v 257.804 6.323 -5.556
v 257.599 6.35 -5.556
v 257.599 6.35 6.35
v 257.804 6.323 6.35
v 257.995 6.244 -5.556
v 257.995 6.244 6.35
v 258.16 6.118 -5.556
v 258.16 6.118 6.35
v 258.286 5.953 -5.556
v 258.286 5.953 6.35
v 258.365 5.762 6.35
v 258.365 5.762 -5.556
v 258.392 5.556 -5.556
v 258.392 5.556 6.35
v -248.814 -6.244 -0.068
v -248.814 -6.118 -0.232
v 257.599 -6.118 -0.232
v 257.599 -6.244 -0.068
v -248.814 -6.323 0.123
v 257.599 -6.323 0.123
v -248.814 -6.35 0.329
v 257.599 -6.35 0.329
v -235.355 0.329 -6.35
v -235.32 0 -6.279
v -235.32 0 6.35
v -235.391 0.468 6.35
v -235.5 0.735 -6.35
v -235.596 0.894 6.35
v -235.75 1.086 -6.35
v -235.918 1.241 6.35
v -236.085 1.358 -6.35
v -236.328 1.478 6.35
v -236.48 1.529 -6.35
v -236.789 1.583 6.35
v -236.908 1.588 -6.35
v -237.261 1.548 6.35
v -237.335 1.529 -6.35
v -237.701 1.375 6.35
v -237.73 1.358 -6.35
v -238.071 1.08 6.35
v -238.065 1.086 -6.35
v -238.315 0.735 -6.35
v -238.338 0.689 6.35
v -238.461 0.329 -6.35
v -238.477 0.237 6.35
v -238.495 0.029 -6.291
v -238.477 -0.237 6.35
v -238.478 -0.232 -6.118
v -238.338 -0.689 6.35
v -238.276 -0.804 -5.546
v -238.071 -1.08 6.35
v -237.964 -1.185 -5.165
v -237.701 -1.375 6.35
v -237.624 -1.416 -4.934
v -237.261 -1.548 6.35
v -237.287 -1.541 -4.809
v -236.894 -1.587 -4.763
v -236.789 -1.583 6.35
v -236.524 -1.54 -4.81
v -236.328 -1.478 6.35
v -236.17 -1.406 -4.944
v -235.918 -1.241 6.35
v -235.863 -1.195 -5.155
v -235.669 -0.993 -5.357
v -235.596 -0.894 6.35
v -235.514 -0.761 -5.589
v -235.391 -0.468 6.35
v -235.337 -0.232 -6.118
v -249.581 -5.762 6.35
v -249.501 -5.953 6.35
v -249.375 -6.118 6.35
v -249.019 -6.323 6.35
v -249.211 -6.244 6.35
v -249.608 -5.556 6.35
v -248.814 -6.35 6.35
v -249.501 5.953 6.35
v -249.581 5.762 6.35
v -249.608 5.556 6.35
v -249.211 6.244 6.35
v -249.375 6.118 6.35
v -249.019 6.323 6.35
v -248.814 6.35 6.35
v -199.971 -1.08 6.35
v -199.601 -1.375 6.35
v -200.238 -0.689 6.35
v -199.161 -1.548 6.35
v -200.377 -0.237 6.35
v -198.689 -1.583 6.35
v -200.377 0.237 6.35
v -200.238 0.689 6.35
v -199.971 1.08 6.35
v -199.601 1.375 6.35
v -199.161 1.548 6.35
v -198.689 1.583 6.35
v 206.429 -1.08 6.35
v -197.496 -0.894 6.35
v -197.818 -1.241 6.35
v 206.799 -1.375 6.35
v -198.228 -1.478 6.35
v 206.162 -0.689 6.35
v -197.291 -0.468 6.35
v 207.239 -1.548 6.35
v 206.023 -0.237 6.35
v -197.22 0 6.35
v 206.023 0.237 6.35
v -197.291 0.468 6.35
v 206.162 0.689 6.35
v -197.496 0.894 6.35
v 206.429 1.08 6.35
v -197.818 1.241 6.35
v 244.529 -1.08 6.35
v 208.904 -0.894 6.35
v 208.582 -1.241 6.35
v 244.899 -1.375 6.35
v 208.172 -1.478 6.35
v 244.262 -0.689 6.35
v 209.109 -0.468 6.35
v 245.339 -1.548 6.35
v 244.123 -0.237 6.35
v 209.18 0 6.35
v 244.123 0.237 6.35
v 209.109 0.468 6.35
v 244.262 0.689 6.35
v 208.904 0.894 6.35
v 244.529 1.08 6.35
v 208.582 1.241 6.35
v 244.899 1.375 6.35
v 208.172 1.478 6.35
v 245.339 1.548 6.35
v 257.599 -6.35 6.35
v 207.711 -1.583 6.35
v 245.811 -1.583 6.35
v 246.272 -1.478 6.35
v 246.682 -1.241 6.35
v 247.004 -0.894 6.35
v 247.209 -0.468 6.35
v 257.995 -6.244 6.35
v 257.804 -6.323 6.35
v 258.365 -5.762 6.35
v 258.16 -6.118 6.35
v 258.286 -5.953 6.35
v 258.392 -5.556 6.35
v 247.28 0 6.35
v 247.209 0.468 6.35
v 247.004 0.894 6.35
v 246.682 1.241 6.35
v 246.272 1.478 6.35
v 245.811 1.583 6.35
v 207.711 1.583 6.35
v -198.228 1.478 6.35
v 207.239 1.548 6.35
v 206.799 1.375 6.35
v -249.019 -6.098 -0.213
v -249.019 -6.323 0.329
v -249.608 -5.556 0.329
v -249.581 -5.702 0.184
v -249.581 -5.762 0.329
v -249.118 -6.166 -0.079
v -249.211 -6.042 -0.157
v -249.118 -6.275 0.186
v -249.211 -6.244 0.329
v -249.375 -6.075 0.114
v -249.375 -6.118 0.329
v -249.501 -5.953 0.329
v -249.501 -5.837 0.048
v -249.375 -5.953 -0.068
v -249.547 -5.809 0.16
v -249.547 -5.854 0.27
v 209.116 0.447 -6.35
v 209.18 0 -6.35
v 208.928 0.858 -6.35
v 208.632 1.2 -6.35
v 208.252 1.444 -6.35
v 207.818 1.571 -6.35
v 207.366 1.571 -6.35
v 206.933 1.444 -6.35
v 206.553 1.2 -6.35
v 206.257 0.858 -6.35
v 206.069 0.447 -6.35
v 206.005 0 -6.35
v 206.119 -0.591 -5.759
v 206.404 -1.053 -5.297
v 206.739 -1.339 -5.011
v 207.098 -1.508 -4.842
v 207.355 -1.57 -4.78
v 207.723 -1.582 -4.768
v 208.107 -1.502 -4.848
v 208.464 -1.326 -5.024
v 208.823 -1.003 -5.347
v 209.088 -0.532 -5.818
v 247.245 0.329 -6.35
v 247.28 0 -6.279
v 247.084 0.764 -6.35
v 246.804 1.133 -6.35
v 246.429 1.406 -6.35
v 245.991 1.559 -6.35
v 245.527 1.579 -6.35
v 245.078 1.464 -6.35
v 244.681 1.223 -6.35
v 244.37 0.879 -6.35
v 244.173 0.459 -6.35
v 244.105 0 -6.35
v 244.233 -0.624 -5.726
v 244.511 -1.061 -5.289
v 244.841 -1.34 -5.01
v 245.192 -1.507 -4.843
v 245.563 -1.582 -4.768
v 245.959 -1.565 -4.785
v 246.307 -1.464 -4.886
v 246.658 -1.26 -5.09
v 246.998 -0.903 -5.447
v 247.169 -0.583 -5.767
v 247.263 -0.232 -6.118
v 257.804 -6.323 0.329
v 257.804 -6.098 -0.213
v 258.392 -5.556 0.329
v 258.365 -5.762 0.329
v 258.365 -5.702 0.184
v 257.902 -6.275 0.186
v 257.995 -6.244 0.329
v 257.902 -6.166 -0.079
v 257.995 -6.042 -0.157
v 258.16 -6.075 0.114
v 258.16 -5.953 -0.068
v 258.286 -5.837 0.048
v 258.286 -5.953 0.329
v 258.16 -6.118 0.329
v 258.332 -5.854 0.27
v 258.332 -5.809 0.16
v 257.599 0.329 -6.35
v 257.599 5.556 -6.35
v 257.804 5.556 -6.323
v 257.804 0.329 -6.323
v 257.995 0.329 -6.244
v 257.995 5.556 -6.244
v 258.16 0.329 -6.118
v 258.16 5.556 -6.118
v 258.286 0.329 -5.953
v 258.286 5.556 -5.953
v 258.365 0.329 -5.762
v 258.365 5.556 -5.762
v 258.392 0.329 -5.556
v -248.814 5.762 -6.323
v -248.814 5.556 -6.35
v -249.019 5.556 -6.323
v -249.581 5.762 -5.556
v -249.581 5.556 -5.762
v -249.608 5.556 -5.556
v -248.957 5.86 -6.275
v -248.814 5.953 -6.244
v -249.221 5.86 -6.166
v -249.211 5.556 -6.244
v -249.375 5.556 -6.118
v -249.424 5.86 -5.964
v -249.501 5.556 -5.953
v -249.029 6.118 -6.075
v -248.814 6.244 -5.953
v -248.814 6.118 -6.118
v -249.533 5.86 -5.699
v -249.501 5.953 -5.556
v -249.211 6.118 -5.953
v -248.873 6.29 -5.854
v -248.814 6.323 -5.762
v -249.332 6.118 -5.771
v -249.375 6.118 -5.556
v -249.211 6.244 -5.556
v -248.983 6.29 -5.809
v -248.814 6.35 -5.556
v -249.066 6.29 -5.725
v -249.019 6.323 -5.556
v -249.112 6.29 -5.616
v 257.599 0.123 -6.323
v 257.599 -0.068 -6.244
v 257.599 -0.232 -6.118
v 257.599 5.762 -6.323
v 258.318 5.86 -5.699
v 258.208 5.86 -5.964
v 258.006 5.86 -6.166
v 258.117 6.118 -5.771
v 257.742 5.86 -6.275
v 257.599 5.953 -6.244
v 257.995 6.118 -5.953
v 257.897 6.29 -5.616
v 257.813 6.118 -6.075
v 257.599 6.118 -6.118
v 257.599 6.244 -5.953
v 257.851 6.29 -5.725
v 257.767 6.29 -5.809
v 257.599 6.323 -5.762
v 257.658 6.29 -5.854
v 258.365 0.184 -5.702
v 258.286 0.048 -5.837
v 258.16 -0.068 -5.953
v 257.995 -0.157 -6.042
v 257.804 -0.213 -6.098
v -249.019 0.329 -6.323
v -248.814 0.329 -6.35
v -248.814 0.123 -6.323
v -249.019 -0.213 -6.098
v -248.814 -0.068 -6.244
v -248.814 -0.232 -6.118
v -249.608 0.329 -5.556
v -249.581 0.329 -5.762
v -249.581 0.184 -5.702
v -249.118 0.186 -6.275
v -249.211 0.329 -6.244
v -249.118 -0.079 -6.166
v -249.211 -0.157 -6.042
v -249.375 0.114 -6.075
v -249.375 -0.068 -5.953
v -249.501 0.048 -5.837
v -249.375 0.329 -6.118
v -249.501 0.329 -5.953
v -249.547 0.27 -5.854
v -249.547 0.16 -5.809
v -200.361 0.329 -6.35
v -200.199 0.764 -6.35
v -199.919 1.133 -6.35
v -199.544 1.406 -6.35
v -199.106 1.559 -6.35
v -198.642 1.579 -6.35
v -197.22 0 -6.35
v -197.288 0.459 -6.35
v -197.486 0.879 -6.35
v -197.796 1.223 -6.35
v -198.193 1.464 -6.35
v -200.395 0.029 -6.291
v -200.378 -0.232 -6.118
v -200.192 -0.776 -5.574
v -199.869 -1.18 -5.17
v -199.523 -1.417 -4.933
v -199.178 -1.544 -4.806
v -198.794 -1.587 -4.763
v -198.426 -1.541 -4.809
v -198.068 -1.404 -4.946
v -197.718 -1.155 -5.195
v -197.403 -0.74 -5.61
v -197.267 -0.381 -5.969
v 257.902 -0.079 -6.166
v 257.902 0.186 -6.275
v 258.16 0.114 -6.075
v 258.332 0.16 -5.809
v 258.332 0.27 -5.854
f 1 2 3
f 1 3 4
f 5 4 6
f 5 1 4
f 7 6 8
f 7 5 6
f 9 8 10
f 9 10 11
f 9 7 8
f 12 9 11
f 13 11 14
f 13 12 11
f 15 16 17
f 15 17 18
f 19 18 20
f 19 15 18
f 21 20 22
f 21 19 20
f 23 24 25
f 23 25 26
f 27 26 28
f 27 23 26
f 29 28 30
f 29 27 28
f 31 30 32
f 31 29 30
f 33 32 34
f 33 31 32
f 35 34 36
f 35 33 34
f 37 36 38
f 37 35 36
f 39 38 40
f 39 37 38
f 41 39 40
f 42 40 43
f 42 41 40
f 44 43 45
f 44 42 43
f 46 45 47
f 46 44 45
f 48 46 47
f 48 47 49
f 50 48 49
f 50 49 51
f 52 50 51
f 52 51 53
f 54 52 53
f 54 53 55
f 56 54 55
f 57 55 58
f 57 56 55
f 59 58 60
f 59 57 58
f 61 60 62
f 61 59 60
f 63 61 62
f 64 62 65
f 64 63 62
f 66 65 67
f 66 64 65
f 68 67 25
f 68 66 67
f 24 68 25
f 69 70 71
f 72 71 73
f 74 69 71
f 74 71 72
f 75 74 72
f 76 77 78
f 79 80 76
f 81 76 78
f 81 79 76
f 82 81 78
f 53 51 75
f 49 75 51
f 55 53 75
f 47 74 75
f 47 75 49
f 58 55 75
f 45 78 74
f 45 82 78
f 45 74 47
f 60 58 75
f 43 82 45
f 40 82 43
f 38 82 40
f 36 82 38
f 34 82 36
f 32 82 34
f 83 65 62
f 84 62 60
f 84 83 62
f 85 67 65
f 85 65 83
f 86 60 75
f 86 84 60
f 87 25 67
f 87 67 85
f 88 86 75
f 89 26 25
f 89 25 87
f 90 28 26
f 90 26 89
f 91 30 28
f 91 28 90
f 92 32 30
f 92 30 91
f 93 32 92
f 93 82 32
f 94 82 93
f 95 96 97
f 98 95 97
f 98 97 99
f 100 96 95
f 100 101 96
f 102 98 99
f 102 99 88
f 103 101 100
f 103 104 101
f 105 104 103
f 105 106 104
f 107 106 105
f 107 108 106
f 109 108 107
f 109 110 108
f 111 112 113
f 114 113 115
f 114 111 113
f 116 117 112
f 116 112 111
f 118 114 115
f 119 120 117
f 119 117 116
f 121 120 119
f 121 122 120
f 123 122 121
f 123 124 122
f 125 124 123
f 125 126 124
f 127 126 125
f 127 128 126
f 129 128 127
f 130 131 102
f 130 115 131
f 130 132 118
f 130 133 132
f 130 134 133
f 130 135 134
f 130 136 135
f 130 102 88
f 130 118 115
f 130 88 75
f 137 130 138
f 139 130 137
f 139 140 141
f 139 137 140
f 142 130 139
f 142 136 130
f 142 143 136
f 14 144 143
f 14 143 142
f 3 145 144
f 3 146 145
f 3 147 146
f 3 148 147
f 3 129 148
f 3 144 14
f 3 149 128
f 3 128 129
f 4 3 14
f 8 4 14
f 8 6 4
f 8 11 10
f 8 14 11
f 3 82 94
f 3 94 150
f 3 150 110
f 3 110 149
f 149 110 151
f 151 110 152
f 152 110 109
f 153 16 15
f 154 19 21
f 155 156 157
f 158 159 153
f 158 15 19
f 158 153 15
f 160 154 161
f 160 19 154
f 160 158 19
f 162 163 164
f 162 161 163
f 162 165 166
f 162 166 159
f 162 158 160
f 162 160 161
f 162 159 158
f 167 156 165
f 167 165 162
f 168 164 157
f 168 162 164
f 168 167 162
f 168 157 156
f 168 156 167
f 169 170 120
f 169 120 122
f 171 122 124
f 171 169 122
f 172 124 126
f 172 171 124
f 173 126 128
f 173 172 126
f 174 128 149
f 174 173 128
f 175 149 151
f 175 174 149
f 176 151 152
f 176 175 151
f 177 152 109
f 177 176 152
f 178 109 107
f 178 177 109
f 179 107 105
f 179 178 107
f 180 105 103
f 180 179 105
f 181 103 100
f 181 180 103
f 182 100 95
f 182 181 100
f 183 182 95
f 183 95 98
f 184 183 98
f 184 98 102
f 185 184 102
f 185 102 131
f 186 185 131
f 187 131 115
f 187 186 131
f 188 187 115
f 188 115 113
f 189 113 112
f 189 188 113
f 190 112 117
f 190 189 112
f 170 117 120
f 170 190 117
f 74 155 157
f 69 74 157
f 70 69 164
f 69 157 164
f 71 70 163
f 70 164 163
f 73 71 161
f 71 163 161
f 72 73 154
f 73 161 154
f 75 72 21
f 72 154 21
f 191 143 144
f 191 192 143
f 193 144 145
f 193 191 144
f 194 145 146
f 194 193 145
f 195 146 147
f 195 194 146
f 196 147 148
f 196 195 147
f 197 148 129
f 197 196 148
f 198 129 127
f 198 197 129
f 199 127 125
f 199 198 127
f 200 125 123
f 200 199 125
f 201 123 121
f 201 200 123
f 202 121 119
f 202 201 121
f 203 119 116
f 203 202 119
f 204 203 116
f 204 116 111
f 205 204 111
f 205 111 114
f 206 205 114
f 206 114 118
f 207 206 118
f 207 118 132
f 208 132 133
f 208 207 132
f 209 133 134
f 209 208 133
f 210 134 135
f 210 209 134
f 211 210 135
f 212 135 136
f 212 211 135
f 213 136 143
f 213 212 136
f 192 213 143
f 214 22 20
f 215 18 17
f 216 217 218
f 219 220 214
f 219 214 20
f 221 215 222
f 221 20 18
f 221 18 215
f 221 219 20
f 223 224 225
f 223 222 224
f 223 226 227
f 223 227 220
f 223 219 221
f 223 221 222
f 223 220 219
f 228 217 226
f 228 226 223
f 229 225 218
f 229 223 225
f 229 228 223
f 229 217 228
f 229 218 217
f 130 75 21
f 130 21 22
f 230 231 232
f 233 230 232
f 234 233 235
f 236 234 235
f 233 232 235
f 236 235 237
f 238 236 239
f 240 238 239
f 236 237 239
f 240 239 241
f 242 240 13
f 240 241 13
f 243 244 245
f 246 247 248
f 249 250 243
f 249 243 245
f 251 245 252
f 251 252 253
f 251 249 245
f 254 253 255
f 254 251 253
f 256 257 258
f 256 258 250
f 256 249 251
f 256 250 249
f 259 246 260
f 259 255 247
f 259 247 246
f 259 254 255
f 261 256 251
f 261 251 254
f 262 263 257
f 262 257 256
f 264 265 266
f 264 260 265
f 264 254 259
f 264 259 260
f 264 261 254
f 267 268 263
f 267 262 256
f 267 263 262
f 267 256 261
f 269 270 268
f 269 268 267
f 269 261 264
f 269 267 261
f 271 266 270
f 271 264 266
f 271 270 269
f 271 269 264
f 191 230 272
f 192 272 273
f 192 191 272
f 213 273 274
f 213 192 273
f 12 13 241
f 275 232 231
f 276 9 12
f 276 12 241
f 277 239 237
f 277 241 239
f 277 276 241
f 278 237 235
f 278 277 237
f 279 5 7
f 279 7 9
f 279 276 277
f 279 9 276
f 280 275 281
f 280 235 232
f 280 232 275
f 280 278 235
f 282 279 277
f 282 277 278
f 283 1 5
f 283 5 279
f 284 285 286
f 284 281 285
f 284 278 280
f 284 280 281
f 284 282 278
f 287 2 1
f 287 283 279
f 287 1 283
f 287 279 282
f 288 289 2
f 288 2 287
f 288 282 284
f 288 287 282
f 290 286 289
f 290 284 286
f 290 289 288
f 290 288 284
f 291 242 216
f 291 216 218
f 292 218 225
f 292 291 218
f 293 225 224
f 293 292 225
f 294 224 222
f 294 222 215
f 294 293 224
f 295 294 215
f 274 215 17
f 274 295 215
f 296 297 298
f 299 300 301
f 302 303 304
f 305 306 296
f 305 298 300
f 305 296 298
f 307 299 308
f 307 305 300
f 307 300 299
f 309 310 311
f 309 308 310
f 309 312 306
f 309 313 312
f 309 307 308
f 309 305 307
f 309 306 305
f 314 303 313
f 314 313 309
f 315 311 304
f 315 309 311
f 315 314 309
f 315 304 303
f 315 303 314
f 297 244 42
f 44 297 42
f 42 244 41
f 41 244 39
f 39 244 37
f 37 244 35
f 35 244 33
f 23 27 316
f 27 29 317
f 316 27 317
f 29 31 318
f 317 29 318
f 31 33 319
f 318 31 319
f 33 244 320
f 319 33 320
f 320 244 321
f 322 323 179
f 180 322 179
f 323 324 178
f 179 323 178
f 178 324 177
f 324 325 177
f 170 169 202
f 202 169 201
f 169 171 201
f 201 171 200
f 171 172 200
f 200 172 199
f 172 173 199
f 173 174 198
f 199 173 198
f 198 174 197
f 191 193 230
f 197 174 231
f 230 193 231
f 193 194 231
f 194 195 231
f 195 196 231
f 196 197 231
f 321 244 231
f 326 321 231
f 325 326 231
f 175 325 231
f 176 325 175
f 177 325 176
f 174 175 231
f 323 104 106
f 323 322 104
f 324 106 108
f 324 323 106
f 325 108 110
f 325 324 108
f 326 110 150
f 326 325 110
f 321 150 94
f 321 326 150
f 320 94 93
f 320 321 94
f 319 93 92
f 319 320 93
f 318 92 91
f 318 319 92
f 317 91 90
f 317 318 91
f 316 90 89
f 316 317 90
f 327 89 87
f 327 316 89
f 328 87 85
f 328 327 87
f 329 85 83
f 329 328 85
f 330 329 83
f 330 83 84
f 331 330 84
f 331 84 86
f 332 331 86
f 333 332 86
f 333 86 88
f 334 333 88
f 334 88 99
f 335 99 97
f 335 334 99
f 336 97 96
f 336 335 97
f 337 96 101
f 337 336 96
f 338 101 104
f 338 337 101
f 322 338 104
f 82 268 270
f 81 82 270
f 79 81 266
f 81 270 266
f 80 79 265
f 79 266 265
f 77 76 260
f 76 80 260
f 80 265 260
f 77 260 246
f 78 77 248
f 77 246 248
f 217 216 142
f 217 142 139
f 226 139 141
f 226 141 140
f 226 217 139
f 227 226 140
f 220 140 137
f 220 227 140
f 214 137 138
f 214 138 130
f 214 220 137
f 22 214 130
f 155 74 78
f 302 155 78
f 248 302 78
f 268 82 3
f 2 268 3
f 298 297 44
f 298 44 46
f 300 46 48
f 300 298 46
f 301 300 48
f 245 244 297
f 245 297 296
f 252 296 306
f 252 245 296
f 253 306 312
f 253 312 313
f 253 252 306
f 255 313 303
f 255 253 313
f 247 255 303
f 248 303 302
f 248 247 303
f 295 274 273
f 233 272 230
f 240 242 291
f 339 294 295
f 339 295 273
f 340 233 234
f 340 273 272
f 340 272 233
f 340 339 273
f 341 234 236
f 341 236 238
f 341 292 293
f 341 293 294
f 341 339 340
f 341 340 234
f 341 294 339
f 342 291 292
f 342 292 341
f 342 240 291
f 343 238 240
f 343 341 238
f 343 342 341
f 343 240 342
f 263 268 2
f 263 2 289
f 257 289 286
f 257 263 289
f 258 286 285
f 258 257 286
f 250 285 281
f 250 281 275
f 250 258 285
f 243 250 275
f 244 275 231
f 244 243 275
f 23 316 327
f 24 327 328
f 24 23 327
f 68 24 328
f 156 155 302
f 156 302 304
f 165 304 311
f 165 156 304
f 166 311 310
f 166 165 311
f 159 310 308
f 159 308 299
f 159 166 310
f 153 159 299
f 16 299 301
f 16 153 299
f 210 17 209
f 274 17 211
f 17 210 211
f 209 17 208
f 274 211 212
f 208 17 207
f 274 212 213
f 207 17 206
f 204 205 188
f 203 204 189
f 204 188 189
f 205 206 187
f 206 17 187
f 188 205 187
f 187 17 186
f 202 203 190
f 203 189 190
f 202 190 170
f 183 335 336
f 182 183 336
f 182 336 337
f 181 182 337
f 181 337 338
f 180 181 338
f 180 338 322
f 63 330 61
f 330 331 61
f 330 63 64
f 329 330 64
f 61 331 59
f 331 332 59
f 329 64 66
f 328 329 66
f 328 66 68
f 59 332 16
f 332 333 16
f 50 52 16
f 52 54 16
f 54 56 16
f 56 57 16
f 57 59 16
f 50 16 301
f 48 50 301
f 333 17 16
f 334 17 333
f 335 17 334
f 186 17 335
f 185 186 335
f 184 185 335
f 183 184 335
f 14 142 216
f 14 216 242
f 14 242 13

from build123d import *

# Parameters (mm, degrees)
F0_W         = 508
F0_H         = 12.7
F0_R         = 1.5875
F1_DEPTH     = 6.35
F2_T1_DEPTH  = 540.6603739472
F3_T1_DEPTH  = 8.3226920908
F3_T3_DEPTH  = 8.0055929849
F3_T5_DEPTH  = 5.2274679849
F3_T7_DEPTH  = 13.890625
F3_T9_DEPTH  = 8.3226920908
F3_T11_DEPTH = 506.4125
F3_T13_DEPTH = 11.1407050378
F3_T15_DEPTH = 36.5689100757
F3_T17_DEPTH = 11.1407050378
F3_T22_DEPTH = 0.809625
F3_T28_DEPTH = 0.809625
F3_S33_W     = 0.809625
F3_S33_H     = 0.809625
F3_T34_DEPTH = 0.809625
F3_T40_DEPTH = 0.809625
F3_T46_DEPTH = 0.809625
F3_S51_W     = 0.809625
F3_S51_H     = 0.809625
F3_T52_DEPTH = 0.809625


# Not quite as in the source:
# - a fillet or chamfer that OpenCascade refuses, or shapes differently, is made with other operations: its cross-section is extruded or revolved along the edge and cut away or added


with BuildPart() as f1:
    # F0 (on Top) → F1 (new body, symmetric)
    with BuildSketch(Plane.XY):
        with Locations((4.392349353, 0)):
            Rectangle(F0_W, F0_H)
        with Locations((-236.907650647, 0)):
            Circle(F0_R, mode=Mode.SUBTRACT)
        with Locations((-198.807650647, 0)):
            Circle(F0_R, mode=Mode.SUBTRACT)
        with Locations((207.592349353, 0)):
            Circle(F0_R, mode=Mode.SUBTRACT)
        with Locations((245.692349353, 0)):
            Circle(F0_R, mode=Mode.SUBTRACT)
    extrude(amount=F1_DEPTH, both=True)

    # F2: chamfer of 6.35 on 1 edges, made by hand

    # F2_s2 → F2_t1 (cut)
    with BuildSketch(Plane.YZ.offset(-265.9378376206)):
        Polygon((-6.35, 0), (0, -6.35), (-6.35, -6.35), align=None)
    extrude(amount=F2_T1_DEPTH, mode=Mode.SUBTRACT)

    # F3: fillet of radius 0.79375 on 13 edges, made by hand

    # F3_s2 → F3_t1 (cut)
    with BuildSketch(Plane(origin=(0, 2.9425160076, -2.9425160076), x_dir=(1, 0, 0), z_dir=(0, -0.7071067812, 0.7071067812))):
        with BuildLine():
            ThreePointArc((258.392349353, -3.6963780605), (258.1598653606, -4.2576440681), (257.598599353, -4.4901280605))
            Line((257.598599353, -4.4901280605), (258.392349353, -4.4901280605))
            Line((258.392349353, -4.4901280605), (258.392349353, -3.6963780605))
        make_face()
    extrude(amount=F3_T1_DEPTH, mode=Mode.SUBTRACT)

    # F3_s4 → F3_t3 (cut)
    with BuildSketch(Plane.XY.offset(0.3287820151)):
        with BuildLine():
            ThreePointArc((258.392349353, -5.55625), (258.1598653606, -6.1175160076), (257.598599353, -6.35))
            Line((257.598599353, -6.35), (258.392349353, -6.35))
            Line((258.392349353, -6.35), (258.392349353, -5.55625))
        make_face()
        with BuildLine():
            ThreePointArc((-249.607650647, -5.55625), (-249.3751666546, -6.1175160076), (-248.813900647, -6.35))
            Line((-248.813900647, -6.35), (-249.607650647, -6.35))
            Line((-249.607650647, -6.35), (-249.607650647, -5.55625))
        make_face()
    extrude(amount=F3_T3_DEPTH, mode=Mode.SUBTRACT)

    # F3_s6 → F3_t5 (cut)
    with BuildSketch(Plane.XZ.offset(-5.55625)):
        with BuildLine():
            ThreePointArc((257.598599353, -6.35), (258.1598653606, -6.1175160076), (258.392349353, -5.55625))
            Line((258.392349353, -5.55625), (258.392349353, -6.35))
            Line((258.392349353, -6.35), (257.598599353, -6.35))
        make_face()
        with BuildLine():
            ThreePointArc((-248.813900647, -6.35), (-249.3751666546, -6.1175160076), (-249.607650647, -5.55625))
            Line((-249.607650647, -5.55625), (-249.607650647, -6.35))
            Line((-249.607650647, -6.35), (-248.813900647, -6.35))
        make_face()
    extrude(amount=F3_T5_DEPTH, mode=Mode.SUBTRACT)

    # F3_s8 → F3_t7 (cut)
    with BuildSketch(Plane.XY.offset(-5.55625)):
        with BuildLine():
            ThreePointArc((257.598599353, 6.35), (258.1598653606, 6.1175160076), (258.392349353, 5.55625))
            Line((258.392349353, 5.55625), (258.392349353, 6.35))
            Line((258.392349353, 6.35), (257.598599353, 6.35))
        make_face()
        with BuildLine():
            ThreePointArc((-248.813900647, 6.35), (-249.3751666546, 6.1175160076), (-249.607650647, 5.55625))
            Line((-249.607650647, 5.55625), (-249.607650647, 6.35))
            Line((-249.607650647, 6.35), (-248.813900647, 6.35))
        make_face()
    extrude(amount=F3_T7_DEPTH, mode=Mode.SUBTRACT)

    # F3_s10 → F3_t9 (cut)
    with BuildSketch(Plane(origin=(0, -2.9425160076, 2.9425160076), x_dir=(1, 0, 0), z_dir=(0, 0.7071067812, -0.7071067812))):
        with BuildLine():
            ThreePointArc((-249.607650647, 3.6963780605), (-249.3751666546, 4.2576440681), (-248.813900647, 4.4901280605))
            Line((-248.813900647, 4.4901280605), (-249.607650647, 4.4901280605))
            Line((-249.607650647, 4.4901280605), (-249.607650647, 3.6963780605))
        make_face()
    extrude(amount=F3_T9_DEPTH, mode=Mode.SUBTRACT)

    # F3_s12 → F3_t11 (cut)
    with BuildSketch(Plane.YZ.offset(-248.813900647)):
        with BuildLine():
            ThreePointArc((-6.1175160076, -0.2324839924), (-6.2895793789, 0.0250270407), (-6.35, 0.3287820151))
            Line((-6.35, 0.3287820151), (-6.35, 0))
            Line((-6.35, 0), (-6.1175160076, -0.2324839924))
        make_face()
        with BuildLine():
            ThreePointArc((6.35, -5.55625), (6.1175160076, -6.1175160076), (5.55625, -6.35))
            Line((5.55625, -6.35), (6.35, -6.35))
            Line((6.35, -6.35), (6.35, -5.55625))
        make_face()
    extrude(amount=F3_T11_DEPTH, mode=Mode.SUBTRACT)

    # F3_s14 → F3_t13 (cut)
    with BuildSketch(Plane.YZ.offset(-248.813900647)):
        with BuildLine():
            ThreePointArc((0.3287820151, -6.35), (0.0250270407, -6.2895793789), (-0.2324839924, -6.1175160076))
            Line((-0.2324839924, -6.1175160076), (0, -6.35))
            Line((0, -6.35), (0.3287820151, -6.35))
        make_face()
    extrude(amount=F3_T13_DEPTH, mode=Mode.SUBTRACT)

    # F3_s16 → F3_t15 (cut)
    with BuildSketch(Plane.YZ.offset(-236.1421056848)):
        with BuildLine():
            ThreePointArc((0.3287820151, -6.35), (0.0250270407, -6.2895793789), (-0.2324839924, -6.1175160076))
            Line((-0.2324839924, -6.1175160076), (0, -6.35))
            Line((0, -6.35), (0.3287820151, -6.35))
        make_face()
    extrude(amount=F3_T15_DEPTH, mode=Mode.SUBTRACT)

    # F3_s18 → F3_t17 (cut)
    with BuildSketch(Plane.YZ.offset(246.4578943152)):
        with BuildLine():
            ThreePointArc((0.3287820151, -6.35), (0.0250270407, -6.2895793789), (-0.2324839924, -6.1175160076))
            Line((-0.2324839924, -6.1175160076), (0, -6.35))
            Line((0, -6.35), (0.3287820151, -6.35))
        make_face()
    extrude(amount=F3_T17_DEPTH, mode=Mode.SUBTRACT)


with BuildPart() as f3_tool20:
    # F3_s21 → F3_t22 (new body)
    with BuildSketch(Plane.YZ.offset(257.598599353)):
        Polygon((0.3287820151, -5.55625), (-0.2437093126, -6.1287413277), (-0.0065756403, -6.365875), (0.3287820151, -6.365875), align=None)
    extrude(amount=F3_T22_DEPTH)

    # F3_s23 → F3_t24 (revolve, cut)
    with BuildSketch(Plane(origin=(257.598599353, 0.3287820151, -5.55625), x_dir=(0, 0.3826834324, 0.9238795325), z_dir=(0, 0.9238795325, -0.3826834324))):
        with BuildLine():
            ThreePointArc((0, -0.79375), (0.79375, 0), (0, 0.79375))
            Line((0, 0.79375), (0, -0.79375))
        make_face()
    revolve(axis=Axis((257.598599353, 0.3287820151, -5.55625), (1, 0, 0)), mode=Mode.SUBTRACT)


with BuildPart() as f1_1:
    add(f1.part)

    # F3_t19: cut F3_tool20
    add(f3_tool20.part, mode=Mode.SUBTRACT)


with BuildPart() as f3_tool26:
    # F3_s27 → F3_t28 (new body)
    with BuildSketch(Plane.YZ.offset(257.598599353)):
        Polygon((-5.55625, 0.3287820151), (-6.1287413277, -0.2437093126), (-6.365875, -0.0065756403), (-6.365875, 0.3287820151), align=None)
    extrude(amount=F3_T28_DEPTH)

    # F3_s29 → F3_t30 (revolve, cut)
    with BuildSketch(Plane(origin=(257.598599353, -5.55625, 0.3287820151), x_dir=(0, 0.9238795325, 0.3826834324), z_dir=(0, 0.3826834324, -0.9238795325))):
        with BuildLine():
            ThreePointArc((0, -0.79375), (0.79375, 0), (0, 0.79375))
            Line((0, 0.79375), (0, -0.79375))
        make_face()
    revolve(axis=Axis((257.598599353, -5.55625, 0.3287820151), (1, 0, 0)), mode=Mode.SUBTRACT)


with BuildPart() as f1_2:
    add(f1_1.part)

    # F3_t25: cut F3_tool26
    add(f3_tool26.part, mode=Mode.SUBTRACT)


with BuildPart() as f3_tool32:
    # F3_s33 → F3_t34 (new body)
    with BuildSketch(Plane.XZ.offset(-5.55625)):
        with Locations((258.003411853, -5.9610625)):
            Rectangle(F3_S33_W, F3_S33_H)
    extrude(amount=-F3_T34_DEPTH)

    # F3_s35 → F3_t36 (revolve, cut)
    with BuildSketch(Plane(origin=(257.598599353, 5.55625, -5.55625), x_dir=(-0.7071067812, 0, 0.7071067812), z_dir=(-0.7071067812, 0, -0.7071067812))):
        with BuildLine():
            ThreePointArc((0, -0.79375), (0.79375, 0), (0, 0.79375))
            Line((0, 0.79375), (0, -0.79375))
        make_face()
    revolve(axis=Axis((257.598599353, 5.55625, -5.55625), (0, 1, 0)), mode=Mode.SUBTRACT)


with BuildPart() as f1_3:
    add(f1_2.part)

    # F3_t31: cut F3_tool32
    add(f3_tool32.part, mode=Mode.SUBTRACT)


with BuildPart() as f3_tool38:
    # F3_s39 → F3_t40 (new body)
    with BuildSketch(Plane.YZ.offset(-248.813900647)):
        Polygon((-5.55625, 0.3287820151), (-6.365875, 0.3287820151), (-6.365875, -0.0065756403), (-6.1287413277, -0.2437093126), align=None)
    extrude(amount=-F3_T40_DEPTH)

    # F3_s41 → F3_t42 (revolve, cut)
    with BuildSketch(Plane(origin=(-248.813900647, -5.55625, 0.3287820151), x_dir=(0, 0.9238795325, 0.3826834324), z_dir=(0, -0.3826834324, 0.9238795325))):
        with BuildLine():
            ThreePointArc((0, -0.79375), (0.79375, 0), (0, 0.79375))
            Line((0, 0.79375), (0, -0.79375))
        make_face()
    revolve(axis=Axis((-248.813900647, -5.55625, 0.3287820151), (-1, 0, 0)), mode=Mode.SUBTRACT)


with BuildPart() as f1_4:
    add(f1_3.part)

    # F3_t37: cut F3_tool38
    add(f3_tool38.part, mode=Mode.SUBTRACT)


with BuildPart() as f3_tool44:
    # F3_s45 → F3_t46 (new body)
    with BuildSketch(Plane.YZ.offset(-248.813900647)):
        Polygon((0.3287820151, -5.55625), (-0.2437093126, -6.1287413277), (-0.0065756403, -6.365875), (0.3287820151, -6.365875), align=None)
    extrude(amount=-F3_T46_DEPTH)

    # F3_s47 → F3_t48 (revolve, cut)
    with BuildSketch(Plane(origin=(-248.813900647, 0.3287820151, -5.55625), x_dir=(0, 0.3826834324, 0.9238795325), z_dir=(0, -0.9238795325, 0.3826834324))):
        with BuildLine():
            ThreePointArc((0, -0.79375), (0.79375, 0), (0, 0.79375))
            Line((0, 0.79375), (0, -0.79375))
        make_face()
    revolve(axis=Axis((-248.813900647, 0.3287820151, -5.55625), (-1, 0, 0)), mode=Mode.SUBTRACT)


with BuildPart() as f1_5:
    add(f1_4.part)

    # F3_t43: cut F3_tool44
    add(f3_tool44.part, mode=Mode.SUBTRACT)


with BuildPart() as f3_tool50:
    # F3_s51 → F3_t52 (new body)
    with BuildSketch(Plane.XZ.offset(-5.55625)):
        with Locations((-249.218713147, -5.9610625)):
            Rectangle(F3_S51_W, F3_S51_H)
    extrude(amount=-F3_T52_DEPTH)

    # F3_s53 → F3_t54 (revolve, cut)
    with BuildSketch(Plane(origin=(-248.813900647, 5.55625, -5.55625), x_dir=(0.7071067812, 0, 0.7071067812), z_dir=(-0.7071067812, 0, 0.7071067812))):
        with BuildLine():
            ThreePointArc((0, -0.79375), (0.79375, 0), (0, 0.79375))
            Line((0, 0.79375), (0, -0.79375))
        make_face()
    revolve(axis=Axis((-248.813900647, 5.55625, -5.55625), (0, 1, 0)), mode=Mode.SUBTRACT)


with BuildPart() as f1_6:
    add(f1_5.part)

    # F3_t49: cut F3_tool50
    add(f3_tool50.part, mode=Mode.SUBTRACT)


solid = f1_6.part
